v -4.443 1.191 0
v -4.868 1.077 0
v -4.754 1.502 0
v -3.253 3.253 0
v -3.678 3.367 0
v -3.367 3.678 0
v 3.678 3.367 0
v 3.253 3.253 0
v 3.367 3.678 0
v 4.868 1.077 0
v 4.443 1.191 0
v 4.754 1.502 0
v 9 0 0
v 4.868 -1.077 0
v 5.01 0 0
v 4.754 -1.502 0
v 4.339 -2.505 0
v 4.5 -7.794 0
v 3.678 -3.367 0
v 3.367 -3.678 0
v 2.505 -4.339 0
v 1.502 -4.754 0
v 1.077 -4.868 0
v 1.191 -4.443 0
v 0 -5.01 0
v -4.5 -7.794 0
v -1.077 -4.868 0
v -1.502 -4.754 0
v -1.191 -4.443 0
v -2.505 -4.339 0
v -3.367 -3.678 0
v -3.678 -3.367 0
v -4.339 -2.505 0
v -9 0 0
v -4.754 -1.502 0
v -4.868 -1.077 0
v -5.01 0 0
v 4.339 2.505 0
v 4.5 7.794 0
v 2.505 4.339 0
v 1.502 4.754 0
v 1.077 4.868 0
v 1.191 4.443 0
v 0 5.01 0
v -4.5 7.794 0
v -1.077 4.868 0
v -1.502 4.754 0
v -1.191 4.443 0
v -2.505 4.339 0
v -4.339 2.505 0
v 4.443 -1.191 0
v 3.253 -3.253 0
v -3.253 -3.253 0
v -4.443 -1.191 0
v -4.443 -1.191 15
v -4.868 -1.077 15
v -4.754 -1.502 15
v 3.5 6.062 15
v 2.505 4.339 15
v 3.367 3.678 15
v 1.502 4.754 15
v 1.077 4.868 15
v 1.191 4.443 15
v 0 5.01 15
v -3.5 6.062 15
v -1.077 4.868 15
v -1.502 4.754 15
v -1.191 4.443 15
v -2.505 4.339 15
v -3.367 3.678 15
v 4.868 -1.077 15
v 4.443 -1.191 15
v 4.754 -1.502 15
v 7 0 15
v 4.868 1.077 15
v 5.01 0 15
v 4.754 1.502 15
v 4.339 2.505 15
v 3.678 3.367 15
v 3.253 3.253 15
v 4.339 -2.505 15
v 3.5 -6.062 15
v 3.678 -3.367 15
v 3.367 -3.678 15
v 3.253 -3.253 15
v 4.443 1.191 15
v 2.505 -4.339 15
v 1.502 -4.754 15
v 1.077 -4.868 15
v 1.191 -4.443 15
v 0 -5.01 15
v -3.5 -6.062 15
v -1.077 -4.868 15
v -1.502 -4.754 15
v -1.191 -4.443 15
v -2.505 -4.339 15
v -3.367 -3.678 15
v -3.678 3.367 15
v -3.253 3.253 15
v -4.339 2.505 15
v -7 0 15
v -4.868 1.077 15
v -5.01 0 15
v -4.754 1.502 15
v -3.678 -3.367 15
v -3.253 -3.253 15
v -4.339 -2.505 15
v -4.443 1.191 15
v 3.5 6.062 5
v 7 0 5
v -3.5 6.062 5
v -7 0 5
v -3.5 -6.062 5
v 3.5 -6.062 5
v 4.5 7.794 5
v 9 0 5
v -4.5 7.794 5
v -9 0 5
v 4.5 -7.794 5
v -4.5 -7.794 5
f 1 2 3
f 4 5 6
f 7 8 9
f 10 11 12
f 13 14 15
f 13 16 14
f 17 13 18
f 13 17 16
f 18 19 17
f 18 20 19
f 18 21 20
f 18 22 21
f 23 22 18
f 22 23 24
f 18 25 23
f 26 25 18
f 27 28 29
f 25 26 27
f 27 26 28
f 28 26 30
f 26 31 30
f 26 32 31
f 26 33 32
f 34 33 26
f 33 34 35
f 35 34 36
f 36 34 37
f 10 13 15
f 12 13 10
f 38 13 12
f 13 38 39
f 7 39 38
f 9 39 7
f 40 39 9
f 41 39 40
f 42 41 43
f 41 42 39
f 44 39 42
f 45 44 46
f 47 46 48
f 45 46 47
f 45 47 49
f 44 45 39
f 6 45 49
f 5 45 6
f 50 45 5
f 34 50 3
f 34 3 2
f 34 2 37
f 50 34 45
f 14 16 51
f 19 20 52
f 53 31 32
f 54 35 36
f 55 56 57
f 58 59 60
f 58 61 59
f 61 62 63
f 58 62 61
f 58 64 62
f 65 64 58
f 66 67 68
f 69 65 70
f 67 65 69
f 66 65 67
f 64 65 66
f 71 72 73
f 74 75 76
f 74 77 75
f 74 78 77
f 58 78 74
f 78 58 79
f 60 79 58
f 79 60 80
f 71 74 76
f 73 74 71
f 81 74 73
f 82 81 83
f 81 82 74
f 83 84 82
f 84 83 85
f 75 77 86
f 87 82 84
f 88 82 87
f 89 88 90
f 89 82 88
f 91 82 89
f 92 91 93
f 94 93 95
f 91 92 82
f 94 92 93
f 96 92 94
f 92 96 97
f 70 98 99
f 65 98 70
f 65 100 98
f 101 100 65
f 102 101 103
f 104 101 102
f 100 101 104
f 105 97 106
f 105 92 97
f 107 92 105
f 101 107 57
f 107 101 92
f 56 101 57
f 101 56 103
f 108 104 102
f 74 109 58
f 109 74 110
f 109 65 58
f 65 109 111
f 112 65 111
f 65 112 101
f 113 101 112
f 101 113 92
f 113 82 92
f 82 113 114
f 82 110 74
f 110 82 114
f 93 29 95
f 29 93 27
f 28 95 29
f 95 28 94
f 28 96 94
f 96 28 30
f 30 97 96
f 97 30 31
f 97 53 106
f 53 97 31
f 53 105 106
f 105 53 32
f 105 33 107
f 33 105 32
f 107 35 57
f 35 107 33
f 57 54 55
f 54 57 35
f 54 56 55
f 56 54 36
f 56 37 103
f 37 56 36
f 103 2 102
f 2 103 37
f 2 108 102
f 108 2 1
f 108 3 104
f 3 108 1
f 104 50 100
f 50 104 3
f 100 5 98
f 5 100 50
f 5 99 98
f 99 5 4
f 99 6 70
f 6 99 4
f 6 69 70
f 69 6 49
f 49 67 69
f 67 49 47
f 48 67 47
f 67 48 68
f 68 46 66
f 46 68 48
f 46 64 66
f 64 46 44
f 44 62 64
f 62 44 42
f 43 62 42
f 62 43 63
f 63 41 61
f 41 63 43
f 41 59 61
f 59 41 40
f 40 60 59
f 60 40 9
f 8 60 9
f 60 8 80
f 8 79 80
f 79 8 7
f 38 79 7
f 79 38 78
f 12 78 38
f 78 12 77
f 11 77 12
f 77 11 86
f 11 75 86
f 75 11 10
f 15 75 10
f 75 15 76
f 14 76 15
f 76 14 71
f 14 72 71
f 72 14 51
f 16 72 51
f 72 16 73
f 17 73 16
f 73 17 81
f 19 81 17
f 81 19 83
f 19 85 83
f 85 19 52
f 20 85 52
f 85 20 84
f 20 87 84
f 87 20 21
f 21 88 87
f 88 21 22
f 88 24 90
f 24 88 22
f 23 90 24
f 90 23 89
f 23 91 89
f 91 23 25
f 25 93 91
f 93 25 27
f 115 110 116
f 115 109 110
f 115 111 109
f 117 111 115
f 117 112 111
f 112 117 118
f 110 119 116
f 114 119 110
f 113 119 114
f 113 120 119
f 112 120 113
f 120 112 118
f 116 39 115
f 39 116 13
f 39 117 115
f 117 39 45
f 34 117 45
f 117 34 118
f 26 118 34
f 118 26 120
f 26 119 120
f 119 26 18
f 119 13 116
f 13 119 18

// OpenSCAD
// file: roundedcube.scad
// Higher definition curves
$fs = 0.01;

module roundedcube(size = [1, 1, 1], center = false, radius = 0.5, apply_to = "all") {
	// If single value, convert to [x, y, z] vector
	size = (size[0] == undef) ? [size, size, size] : size;

	translate_min = radius;
	translate_xmax = size[0] - radius;
	translate_ymax = size[1] - radius;
	translate_zmax = size[2] - radius;

	diameter = radius * 2;

	module build_point(type = "sphere", rotate = [0, 0, 0]) {
		if (type == "sphere") {
			sphere(r = radius);
		} else if (type == "cylinder") {
			rotate(a = rotate)
			cylinder(h = diameter, r = radius, center = true);
		}
	}

	obj_translate = (center == false) ?
		[0, 0, 0] : [
			-(size[0] / 2),
			-(size[1] / 2),
			-(size[2] / 2)
		];

	translate(v = obj_translate) {
		hull() {
			for (translate_x = [translate_min, translate_xmax]) {
				x_at = (translate_x == translate_min) ? "min" : "max";
				for (translate_y = [translate_min, translate_ymax]) {
					y_at = (translate_y == translate_min) ? "min" : "max";
					for (translate_z = [translate_min, translate_zmax]) {
						z_at = (translate_z == translate_min) ? "min" : "max";

						translate(v = [translate_x, translate_y, translate_z])
						if (
							(apply_to == "all") ||
							(apply_to == "xmin" && x_at == "min") || (apply_to == "xmax" && x_at == "max") ||
							(apply_to == "ymin" && y_at == "min") || (apply_to == "ymax" && y_at == "max") ||
							(apply_to == "zmin" && z_at == "min") || (apply_to == "zmax" && z_at == "max")
						) {
							build_point("sphere");
						} else {
							rotate = 
								(apply_to == "xmin" || apply_to == "xmax" || apply_to == "x") ? [0, 90, 0] : (
								(apply_to == "ymin" || apply_to == "ymax" || apply_to == "y") ? [90, 90, 0] :
								[0, 0, 0]
							);
							build_point("cylinder", rotate);
						}
					}
				}
			}
		}
	}
}
// file: dimensions.scad
include<roundedcube.scad>

$fa = 2.0;
$fs = 0.1; // filament size / 2

$fn= $preview ? 32 : 150;

//VARIABLES
magnet_h = 20;
magnet_l = 60;
magnet_w = 5;

metal_bar_long_l = 68;
metal_bar_long_w = 2;
metal_bar_long_h = 10;

bolt_hole_r = 3 / 2;
bolt_hole_depth = 7;
bolt_hole_thickness = 2;

ribbon_opening_l = 58;
ribbon_opening_w = 18;

case_l = metal_bar_long_l;
case_w = 40;
case_h = 7;
case_floor_th = case_h - magnet_w;

magnet_cutout_w = magnet_w;
magnet_cutout_l = 1;

magnet_guard_th = 0.3;

aux_body_r = 12/2;
aux_th = 2;
aux_body_outer_r = aux_body_r + aux_th;

aux_body_h = 11;
aux_ring_h = 2;
aux_ring_r = 15;


aux_body_cutout = 11;


plate_th = 2.5;
plate_d = 95 ;
plate_offset_h = 2;
plate_offset_w = 2;


grille_th = plate_th;
grille_r = sqrt(3)/2 * (plate_d/2 -5);

mounting_hole_spacing = 10;
spacing = 0.01;
body_mounting_hole_offset = plate_offset_h;

inner_r = sqrt(3)/2*plate_d/2;
body_h = 30;



headband_mount_outer_d = 7;
headband_mount_inner_d = 5;
headband_mount_length_1 = 15; 

// <__________________________> //

module plate_base(){
rotate([0,0,90]) 
            linear_extrude(height = plate_th, center = true)
                circle(r = plate_d/2 - plate_offset_w);
}

module ribbon_opening (fillet = 1) {
    if (fillet == 0)
        cube([ribbon_opening_w, ribbon_opening_l, 10], center = true);
    
    else if (fillet == 1)
        roundedcube([ribbon_opening_w, ribbon_opening_l, 10], center = true, radius = 1, "all");
    
}

module ribbon_bolt_holes() {
    for (i = [-25 : 25 : 25], j = [-1 : 2 : 1])
            translate([j * case_w/2, i, 0]) bolt_hole();
}    

module ribbon_bolt_outer_shell() {
for (i = [-25 : 25 : 25], j = [-1 : 2 : 1])
                translate([j * case_w/2, i, 0]) bolt_outer();    
}


module mounting_holes() {
    for(i = [-3 : 3])
       rotate(i * 360/6)
            translate([0, plate_d/2 - mounting_hole_spacing, 0])
                bolt_hole();
}



module bolt_outer () {
    linear_extrude(height = bolt_hole_depth, center = true)
        circle(bolt_hole_r + bolt_hole_thickness);

}

module bolt_hole () {
    linear_extrude(height = bolt_hole_depth + spacing, center = true)
        circle(bolt_hole_r);

}
// main file
include <dimensions.scad>


module triangles (){
         for (i = [0:30:360])
                            rotate([0, 0, i+15])
                                translate([-headband_mount_inner_d+0.1, 0, 0])
                                    color("red") circle(0.3, $fn = 3);
    }
    
module outer_shell(radius_off = 0){color("blue") circle(headband_mount_outer_d + radius_off, $fn = 6);}

module inner_shell(){color("green") circle(headband_mount_inner_d + spacing, $fn = 24);}
    
    
module headband_mount(triangle = true, length = 0){
    
    
    union(){
        linear_extrude(headband_mount_length_1 + length){
            difference(){
                       outer_shell();
                       if (triangle) inner_shell();
                }
                if (triangle) triangles();
            }
        linear_extrude(5 + length){
            difference(){
                       outer_shell(2);
                       if (triangle) inner_shell();
                }
                if (triangle) triangles();
            }
    }
}

headband_mount();

module headband_mount_hole(length = 0){
    headband_mount(false, length);
}
